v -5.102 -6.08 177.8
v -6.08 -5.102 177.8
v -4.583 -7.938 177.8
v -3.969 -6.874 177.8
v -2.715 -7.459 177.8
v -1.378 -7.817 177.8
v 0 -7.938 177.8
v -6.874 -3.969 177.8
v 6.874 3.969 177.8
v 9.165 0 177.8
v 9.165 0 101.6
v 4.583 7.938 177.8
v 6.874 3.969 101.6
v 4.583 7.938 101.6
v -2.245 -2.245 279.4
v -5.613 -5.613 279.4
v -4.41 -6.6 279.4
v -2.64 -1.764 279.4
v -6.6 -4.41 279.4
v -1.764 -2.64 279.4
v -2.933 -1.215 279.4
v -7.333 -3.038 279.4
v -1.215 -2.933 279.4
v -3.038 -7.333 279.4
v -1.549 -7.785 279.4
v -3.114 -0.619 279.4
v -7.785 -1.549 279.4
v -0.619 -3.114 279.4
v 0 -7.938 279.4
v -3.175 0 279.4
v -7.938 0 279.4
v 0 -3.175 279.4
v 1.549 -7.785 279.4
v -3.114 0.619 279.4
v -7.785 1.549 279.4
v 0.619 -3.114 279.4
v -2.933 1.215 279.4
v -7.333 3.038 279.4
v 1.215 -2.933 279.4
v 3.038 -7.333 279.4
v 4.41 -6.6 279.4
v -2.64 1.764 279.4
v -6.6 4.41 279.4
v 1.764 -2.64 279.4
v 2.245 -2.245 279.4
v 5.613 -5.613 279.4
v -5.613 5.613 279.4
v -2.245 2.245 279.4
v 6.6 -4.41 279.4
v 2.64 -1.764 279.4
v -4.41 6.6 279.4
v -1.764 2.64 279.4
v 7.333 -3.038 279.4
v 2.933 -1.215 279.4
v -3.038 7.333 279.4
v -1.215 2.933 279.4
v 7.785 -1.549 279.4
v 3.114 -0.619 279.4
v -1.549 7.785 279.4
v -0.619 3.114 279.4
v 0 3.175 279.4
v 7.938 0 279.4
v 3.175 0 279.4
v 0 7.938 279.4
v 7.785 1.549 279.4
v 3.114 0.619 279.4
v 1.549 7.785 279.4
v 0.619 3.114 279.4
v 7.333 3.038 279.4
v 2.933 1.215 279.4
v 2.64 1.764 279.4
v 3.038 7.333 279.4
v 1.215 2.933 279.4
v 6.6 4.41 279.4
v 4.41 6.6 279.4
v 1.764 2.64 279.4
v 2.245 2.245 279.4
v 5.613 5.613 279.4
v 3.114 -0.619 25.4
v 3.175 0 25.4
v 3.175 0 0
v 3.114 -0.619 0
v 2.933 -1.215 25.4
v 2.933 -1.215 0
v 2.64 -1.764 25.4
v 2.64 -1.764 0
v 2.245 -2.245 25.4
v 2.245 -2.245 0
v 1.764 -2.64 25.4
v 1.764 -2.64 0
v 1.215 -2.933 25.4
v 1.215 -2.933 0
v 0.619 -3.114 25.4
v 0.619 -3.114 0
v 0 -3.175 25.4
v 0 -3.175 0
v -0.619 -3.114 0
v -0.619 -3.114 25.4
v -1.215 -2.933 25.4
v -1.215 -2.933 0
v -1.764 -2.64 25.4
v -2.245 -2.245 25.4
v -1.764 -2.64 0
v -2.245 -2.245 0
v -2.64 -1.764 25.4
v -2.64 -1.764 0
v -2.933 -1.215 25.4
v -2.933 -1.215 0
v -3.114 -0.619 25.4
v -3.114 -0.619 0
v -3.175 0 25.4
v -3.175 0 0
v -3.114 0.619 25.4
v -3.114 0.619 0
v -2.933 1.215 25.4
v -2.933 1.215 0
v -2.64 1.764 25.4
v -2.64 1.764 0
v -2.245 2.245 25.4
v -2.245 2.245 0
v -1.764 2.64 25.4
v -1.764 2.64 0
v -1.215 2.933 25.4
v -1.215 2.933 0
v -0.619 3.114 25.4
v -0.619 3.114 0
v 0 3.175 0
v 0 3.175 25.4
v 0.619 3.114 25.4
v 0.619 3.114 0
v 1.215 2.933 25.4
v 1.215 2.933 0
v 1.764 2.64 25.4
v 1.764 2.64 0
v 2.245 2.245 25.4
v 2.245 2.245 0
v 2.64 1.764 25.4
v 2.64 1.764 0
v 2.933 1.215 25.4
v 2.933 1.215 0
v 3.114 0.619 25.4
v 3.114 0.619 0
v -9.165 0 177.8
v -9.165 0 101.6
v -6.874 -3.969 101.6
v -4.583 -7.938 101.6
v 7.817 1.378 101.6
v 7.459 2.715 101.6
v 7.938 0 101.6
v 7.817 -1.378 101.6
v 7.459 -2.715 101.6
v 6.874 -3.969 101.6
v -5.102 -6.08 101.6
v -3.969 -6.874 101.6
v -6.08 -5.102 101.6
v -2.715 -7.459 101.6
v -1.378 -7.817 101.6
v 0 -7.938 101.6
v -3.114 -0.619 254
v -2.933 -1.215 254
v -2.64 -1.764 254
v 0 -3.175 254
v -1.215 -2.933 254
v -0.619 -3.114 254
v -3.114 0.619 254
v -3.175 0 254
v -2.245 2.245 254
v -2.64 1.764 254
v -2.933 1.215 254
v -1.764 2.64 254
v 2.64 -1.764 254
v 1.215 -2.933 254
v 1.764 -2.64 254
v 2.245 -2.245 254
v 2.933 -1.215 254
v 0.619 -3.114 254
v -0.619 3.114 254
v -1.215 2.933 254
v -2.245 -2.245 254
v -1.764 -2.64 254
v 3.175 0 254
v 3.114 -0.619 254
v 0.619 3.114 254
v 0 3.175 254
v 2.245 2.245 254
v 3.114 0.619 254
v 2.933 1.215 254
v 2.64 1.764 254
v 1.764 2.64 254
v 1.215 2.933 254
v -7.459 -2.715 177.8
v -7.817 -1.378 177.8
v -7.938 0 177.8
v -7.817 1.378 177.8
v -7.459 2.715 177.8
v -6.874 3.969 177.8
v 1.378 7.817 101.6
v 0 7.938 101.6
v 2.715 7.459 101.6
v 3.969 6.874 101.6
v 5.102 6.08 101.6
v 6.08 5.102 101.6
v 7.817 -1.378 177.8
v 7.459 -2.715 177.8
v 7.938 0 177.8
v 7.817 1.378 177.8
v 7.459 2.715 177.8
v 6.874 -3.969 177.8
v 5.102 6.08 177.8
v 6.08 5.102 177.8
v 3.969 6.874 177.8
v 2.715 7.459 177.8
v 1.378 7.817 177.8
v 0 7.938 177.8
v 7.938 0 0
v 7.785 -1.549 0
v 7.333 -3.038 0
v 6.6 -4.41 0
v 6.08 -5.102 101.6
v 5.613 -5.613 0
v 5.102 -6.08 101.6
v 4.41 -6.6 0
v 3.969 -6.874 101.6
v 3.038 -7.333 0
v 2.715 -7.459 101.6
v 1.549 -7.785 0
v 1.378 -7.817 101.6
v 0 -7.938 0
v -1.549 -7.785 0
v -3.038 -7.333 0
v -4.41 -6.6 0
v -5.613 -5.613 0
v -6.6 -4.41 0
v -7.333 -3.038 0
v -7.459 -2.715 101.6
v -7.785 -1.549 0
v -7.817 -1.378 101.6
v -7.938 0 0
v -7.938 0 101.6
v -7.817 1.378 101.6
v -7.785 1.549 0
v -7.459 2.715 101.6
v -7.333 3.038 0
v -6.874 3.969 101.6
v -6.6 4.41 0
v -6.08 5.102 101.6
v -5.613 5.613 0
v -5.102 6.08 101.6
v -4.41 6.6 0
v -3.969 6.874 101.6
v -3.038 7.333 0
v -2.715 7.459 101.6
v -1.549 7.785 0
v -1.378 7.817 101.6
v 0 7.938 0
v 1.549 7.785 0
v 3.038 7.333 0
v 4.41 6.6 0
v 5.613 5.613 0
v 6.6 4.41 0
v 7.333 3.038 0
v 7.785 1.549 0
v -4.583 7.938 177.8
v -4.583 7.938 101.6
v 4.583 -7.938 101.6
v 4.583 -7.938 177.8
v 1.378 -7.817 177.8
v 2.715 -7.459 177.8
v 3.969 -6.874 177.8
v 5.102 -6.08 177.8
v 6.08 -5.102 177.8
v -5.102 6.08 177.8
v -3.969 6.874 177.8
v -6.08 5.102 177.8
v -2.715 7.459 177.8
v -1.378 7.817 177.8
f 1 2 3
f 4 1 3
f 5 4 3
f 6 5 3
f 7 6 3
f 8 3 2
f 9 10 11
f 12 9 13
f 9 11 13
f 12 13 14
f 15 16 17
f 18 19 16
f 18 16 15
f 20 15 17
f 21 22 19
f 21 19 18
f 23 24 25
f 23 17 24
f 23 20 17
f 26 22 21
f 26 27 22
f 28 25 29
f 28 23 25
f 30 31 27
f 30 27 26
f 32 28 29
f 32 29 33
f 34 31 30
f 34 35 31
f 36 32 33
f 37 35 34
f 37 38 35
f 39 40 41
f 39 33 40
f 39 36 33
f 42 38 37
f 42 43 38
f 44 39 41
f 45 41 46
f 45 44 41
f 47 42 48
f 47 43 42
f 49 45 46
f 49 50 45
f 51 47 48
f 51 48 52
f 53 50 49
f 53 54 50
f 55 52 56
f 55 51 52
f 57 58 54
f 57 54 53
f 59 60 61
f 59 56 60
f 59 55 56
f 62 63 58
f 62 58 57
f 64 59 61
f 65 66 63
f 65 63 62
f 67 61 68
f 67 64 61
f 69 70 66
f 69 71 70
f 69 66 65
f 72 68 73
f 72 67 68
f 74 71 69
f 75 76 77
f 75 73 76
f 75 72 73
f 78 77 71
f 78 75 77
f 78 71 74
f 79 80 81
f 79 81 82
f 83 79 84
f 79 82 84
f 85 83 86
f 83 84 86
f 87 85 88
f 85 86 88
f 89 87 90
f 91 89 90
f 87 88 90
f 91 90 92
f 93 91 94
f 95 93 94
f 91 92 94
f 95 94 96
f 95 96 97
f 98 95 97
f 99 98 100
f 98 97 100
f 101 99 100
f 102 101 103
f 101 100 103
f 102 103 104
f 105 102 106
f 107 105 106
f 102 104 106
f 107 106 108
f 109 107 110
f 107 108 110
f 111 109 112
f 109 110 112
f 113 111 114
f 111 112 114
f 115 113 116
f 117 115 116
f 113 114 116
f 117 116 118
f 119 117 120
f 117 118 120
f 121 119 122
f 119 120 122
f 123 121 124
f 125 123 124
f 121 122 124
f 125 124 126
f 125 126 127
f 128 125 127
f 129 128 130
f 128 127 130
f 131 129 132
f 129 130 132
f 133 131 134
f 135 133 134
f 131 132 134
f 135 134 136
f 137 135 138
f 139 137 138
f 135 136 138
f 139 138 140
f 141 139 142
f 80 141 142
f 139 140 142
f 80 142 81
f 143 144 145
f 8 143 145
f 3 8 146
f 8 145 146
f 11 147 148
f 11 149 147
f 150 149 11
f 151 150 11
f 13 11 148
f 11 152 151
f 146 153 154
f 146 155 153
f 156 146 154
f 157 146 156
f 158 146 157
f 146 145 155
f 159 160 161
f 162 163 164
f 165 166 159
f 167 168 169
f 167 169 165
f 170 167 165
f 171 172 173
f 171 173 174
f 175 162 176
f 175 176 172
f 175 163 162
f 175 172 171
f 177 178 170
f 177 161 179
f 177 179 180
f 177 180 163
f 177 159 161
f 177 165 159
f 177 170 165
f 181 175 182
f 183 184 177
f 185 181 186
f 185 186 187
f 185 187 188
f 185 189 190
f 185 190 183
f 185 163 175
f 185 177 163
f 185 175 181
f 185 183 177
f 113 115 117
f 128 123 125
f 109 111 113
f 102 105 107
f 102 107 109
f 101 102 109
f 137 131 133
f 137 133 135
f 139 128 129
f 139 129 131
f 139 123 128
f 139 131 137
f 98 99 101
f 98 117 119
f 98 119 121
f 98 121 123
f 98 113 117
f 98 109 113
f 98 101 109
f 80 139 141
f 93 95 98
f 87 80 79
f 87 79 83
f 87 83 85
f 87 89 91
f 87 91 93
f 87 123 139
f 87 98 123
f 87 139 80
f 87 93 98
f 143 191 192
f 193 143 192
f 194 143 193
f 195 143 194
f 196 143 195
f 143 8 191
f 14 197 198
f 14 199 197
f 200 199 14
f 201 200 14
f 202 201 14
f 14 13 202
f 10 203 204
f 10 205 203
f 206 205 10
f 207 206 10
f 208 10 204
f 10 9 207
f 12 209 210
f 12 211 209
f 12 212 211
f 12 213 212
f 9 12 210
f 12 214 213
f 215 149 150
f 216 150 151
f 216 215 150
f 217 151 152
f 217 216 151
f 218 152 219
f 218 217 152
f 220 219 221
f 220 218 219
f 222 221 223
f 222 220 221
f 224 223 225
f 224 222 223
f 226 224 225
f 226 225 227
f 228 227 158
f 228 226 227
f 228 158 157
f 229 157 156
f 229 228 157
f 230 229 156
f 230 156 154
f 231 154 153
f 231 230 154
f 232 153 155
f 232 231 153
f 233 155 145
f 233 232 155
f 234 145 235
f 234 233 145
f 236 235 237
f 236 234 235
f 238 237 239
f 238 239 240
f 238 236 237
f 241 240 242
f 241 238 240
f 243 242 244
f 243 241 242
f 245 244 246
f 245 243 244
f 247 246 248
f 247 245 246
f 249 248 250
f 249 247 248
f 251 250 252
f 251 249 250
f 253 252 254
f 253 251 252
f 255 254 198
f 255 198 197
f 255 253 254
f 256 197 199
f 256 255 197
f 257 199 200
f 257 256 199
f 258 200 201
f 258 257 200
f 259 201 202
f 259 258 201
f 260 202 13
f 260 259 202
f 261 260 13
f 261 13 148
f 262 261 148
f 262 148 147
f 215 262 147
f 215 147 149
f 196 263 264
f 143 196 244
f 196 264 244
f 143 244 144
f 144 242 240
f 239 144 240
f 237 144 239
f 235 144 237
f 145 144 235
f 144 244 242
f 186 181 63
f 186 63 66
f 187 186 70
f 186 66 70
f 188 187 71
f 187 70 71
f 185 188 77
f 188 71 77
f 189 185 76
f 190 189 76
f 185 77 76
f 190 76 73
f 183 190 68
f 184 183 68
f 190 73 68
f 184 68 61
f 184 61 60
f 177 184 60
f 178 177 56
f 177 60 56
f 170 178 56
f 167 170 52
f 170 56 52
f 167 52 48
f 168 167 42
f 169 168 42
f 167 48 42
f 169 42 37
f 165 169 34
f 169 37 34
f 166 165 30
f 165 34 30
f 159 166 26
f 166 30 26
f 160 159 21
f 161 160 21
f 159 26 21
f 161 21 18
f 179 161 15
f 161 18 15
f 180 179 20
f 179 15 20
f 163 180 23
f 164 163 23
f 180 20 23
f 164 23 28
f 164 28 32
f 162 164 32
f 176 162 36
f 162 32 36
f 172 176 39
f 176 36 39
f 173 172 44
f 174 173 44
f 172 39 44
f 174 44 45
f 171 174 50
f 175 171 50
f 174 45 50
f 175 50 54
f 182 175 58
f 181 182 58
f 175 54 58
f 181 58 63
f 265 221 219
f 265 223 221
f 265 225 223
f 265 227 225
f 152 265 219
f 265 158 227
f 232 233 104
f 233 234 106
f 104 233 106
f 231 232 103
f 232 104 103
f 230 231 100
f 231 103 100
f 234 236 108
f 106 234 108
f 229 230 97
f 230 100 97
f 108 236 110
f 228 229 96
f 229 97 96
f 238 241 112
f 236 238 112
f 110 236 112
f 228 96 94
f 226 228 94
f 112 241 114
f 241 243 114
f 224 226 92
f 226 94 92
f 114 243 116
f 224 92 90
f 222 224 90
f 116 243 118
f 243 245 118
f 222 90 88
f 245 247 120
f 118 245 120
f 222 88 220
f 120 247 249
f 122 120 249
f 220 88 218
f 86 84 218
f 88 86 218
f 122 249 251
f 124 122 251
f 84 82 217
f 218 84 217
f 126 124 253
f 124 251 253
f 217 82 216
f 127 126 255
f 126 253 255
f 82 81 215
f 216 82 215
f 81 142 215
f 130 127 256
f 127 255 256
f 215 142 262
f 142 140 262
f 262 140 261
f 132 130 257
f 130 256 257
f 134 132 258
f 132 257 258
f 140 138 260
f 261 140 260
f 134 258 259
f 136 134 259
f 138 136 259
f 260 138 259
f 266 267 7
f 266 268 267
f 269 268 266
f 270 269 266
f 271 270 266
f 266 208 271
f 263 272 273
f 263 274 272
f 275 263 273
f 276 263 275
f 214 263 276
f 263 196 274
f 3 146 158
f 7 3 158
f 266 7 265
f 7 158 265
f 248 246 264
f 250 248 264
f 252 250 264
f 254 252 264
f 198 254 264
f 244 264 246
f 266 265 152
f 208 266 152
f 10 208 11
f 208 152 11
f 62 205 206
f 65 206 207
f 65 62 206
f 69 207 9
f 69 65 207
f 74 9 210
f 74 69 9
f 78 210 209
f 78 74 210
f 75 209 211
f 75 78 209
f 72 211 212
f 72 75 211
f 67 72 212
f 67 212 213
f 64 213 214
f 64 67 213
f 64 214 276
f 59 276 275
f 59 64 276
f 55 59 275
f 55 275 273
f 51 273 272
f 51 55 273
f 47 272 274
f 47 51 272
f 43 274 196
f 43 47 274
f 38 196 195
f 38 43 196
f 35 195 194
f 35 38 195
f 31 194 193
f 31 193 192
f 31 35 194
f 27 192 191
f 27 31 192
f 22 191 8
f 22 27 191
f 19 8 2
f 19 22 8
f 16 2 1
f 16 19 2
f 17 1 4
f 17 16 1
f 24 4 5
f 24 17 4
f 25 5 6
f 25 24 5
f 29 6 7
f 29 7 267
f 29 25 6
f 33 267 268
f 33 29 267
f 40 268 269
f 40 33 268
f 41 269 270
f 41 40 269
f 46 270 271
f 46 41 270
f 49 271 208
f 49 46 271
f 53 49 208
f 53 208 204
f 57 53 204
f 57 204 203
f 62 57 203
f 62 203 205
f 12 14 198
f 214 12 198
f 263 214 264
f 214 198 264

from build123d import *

# Parameters (mm, degrees)
F1_DEPTH = 279.4
F2_R     = 9.165436
F2_R_2   = 7.9375
F3_DEPTH = 101.6
F4_R     = 9.165436
F4_R_2   = 7.9375
F5_DEPTH = 101.6
F6_R     = 3.175
F7_DEPTH = 25.4
F8_R     = 3.175
F9_DEPTH = 25.4


with BuildPart() as f1:
    # F0 (on Top) → F1 (new body)
    with BuildSketch(Plane.XY):
        Polygon((-4.582718, 7.9375), (-9.165436, 0), (-4.582718, -7.9375), (4.582718, -7.9375), (9.165436, 0), (4.582718, 7.9375), align=None)
    extrude(amount=F1_DEPTH)

    # F2 (on face) → F3 (cut)
    with BuildSketch(Plane.XY.offset(279.4)):
        Circle(F2_R)
        Circle(F2_R_2, mode=Mode.SUBTRACT)
    extrude(amount=-F3_DEPTH, mode=Mode.SUBTRACT)

    # F4 (on face) → F5 (cut)
    with BuildSketch(Plane(origin=(0, 0, 0), x_dir=(1, 0, 0), z_dir=(0, 0, -1))):
        Circle(F4_R)
        Circle(F4_R_2, mode=Mode.SUBTRACT)
    extrude(amount=-F5_DEPTH, mode=Mode.SUBTRACT)

    # F6 (on face) → F7 (cut)
    with BuildSketch(Plane(origin=(0, 0, 0), x_dir=(1, 0, 0), z_dir=(0, 0, -1))):
        Circle(F6_R)
    extrude(amount=-F7_DEPTH, mode=Mode.SUBTRACT)

    # F8 (on face) → F9 (cut)
    with BuildSketch(Plane.XY.offset(279.4)):
        Circle(F8_R)
    extrude(amount=-F9_DEPTH, mode=Mode.SUBTRACT)


solid = f1.part
